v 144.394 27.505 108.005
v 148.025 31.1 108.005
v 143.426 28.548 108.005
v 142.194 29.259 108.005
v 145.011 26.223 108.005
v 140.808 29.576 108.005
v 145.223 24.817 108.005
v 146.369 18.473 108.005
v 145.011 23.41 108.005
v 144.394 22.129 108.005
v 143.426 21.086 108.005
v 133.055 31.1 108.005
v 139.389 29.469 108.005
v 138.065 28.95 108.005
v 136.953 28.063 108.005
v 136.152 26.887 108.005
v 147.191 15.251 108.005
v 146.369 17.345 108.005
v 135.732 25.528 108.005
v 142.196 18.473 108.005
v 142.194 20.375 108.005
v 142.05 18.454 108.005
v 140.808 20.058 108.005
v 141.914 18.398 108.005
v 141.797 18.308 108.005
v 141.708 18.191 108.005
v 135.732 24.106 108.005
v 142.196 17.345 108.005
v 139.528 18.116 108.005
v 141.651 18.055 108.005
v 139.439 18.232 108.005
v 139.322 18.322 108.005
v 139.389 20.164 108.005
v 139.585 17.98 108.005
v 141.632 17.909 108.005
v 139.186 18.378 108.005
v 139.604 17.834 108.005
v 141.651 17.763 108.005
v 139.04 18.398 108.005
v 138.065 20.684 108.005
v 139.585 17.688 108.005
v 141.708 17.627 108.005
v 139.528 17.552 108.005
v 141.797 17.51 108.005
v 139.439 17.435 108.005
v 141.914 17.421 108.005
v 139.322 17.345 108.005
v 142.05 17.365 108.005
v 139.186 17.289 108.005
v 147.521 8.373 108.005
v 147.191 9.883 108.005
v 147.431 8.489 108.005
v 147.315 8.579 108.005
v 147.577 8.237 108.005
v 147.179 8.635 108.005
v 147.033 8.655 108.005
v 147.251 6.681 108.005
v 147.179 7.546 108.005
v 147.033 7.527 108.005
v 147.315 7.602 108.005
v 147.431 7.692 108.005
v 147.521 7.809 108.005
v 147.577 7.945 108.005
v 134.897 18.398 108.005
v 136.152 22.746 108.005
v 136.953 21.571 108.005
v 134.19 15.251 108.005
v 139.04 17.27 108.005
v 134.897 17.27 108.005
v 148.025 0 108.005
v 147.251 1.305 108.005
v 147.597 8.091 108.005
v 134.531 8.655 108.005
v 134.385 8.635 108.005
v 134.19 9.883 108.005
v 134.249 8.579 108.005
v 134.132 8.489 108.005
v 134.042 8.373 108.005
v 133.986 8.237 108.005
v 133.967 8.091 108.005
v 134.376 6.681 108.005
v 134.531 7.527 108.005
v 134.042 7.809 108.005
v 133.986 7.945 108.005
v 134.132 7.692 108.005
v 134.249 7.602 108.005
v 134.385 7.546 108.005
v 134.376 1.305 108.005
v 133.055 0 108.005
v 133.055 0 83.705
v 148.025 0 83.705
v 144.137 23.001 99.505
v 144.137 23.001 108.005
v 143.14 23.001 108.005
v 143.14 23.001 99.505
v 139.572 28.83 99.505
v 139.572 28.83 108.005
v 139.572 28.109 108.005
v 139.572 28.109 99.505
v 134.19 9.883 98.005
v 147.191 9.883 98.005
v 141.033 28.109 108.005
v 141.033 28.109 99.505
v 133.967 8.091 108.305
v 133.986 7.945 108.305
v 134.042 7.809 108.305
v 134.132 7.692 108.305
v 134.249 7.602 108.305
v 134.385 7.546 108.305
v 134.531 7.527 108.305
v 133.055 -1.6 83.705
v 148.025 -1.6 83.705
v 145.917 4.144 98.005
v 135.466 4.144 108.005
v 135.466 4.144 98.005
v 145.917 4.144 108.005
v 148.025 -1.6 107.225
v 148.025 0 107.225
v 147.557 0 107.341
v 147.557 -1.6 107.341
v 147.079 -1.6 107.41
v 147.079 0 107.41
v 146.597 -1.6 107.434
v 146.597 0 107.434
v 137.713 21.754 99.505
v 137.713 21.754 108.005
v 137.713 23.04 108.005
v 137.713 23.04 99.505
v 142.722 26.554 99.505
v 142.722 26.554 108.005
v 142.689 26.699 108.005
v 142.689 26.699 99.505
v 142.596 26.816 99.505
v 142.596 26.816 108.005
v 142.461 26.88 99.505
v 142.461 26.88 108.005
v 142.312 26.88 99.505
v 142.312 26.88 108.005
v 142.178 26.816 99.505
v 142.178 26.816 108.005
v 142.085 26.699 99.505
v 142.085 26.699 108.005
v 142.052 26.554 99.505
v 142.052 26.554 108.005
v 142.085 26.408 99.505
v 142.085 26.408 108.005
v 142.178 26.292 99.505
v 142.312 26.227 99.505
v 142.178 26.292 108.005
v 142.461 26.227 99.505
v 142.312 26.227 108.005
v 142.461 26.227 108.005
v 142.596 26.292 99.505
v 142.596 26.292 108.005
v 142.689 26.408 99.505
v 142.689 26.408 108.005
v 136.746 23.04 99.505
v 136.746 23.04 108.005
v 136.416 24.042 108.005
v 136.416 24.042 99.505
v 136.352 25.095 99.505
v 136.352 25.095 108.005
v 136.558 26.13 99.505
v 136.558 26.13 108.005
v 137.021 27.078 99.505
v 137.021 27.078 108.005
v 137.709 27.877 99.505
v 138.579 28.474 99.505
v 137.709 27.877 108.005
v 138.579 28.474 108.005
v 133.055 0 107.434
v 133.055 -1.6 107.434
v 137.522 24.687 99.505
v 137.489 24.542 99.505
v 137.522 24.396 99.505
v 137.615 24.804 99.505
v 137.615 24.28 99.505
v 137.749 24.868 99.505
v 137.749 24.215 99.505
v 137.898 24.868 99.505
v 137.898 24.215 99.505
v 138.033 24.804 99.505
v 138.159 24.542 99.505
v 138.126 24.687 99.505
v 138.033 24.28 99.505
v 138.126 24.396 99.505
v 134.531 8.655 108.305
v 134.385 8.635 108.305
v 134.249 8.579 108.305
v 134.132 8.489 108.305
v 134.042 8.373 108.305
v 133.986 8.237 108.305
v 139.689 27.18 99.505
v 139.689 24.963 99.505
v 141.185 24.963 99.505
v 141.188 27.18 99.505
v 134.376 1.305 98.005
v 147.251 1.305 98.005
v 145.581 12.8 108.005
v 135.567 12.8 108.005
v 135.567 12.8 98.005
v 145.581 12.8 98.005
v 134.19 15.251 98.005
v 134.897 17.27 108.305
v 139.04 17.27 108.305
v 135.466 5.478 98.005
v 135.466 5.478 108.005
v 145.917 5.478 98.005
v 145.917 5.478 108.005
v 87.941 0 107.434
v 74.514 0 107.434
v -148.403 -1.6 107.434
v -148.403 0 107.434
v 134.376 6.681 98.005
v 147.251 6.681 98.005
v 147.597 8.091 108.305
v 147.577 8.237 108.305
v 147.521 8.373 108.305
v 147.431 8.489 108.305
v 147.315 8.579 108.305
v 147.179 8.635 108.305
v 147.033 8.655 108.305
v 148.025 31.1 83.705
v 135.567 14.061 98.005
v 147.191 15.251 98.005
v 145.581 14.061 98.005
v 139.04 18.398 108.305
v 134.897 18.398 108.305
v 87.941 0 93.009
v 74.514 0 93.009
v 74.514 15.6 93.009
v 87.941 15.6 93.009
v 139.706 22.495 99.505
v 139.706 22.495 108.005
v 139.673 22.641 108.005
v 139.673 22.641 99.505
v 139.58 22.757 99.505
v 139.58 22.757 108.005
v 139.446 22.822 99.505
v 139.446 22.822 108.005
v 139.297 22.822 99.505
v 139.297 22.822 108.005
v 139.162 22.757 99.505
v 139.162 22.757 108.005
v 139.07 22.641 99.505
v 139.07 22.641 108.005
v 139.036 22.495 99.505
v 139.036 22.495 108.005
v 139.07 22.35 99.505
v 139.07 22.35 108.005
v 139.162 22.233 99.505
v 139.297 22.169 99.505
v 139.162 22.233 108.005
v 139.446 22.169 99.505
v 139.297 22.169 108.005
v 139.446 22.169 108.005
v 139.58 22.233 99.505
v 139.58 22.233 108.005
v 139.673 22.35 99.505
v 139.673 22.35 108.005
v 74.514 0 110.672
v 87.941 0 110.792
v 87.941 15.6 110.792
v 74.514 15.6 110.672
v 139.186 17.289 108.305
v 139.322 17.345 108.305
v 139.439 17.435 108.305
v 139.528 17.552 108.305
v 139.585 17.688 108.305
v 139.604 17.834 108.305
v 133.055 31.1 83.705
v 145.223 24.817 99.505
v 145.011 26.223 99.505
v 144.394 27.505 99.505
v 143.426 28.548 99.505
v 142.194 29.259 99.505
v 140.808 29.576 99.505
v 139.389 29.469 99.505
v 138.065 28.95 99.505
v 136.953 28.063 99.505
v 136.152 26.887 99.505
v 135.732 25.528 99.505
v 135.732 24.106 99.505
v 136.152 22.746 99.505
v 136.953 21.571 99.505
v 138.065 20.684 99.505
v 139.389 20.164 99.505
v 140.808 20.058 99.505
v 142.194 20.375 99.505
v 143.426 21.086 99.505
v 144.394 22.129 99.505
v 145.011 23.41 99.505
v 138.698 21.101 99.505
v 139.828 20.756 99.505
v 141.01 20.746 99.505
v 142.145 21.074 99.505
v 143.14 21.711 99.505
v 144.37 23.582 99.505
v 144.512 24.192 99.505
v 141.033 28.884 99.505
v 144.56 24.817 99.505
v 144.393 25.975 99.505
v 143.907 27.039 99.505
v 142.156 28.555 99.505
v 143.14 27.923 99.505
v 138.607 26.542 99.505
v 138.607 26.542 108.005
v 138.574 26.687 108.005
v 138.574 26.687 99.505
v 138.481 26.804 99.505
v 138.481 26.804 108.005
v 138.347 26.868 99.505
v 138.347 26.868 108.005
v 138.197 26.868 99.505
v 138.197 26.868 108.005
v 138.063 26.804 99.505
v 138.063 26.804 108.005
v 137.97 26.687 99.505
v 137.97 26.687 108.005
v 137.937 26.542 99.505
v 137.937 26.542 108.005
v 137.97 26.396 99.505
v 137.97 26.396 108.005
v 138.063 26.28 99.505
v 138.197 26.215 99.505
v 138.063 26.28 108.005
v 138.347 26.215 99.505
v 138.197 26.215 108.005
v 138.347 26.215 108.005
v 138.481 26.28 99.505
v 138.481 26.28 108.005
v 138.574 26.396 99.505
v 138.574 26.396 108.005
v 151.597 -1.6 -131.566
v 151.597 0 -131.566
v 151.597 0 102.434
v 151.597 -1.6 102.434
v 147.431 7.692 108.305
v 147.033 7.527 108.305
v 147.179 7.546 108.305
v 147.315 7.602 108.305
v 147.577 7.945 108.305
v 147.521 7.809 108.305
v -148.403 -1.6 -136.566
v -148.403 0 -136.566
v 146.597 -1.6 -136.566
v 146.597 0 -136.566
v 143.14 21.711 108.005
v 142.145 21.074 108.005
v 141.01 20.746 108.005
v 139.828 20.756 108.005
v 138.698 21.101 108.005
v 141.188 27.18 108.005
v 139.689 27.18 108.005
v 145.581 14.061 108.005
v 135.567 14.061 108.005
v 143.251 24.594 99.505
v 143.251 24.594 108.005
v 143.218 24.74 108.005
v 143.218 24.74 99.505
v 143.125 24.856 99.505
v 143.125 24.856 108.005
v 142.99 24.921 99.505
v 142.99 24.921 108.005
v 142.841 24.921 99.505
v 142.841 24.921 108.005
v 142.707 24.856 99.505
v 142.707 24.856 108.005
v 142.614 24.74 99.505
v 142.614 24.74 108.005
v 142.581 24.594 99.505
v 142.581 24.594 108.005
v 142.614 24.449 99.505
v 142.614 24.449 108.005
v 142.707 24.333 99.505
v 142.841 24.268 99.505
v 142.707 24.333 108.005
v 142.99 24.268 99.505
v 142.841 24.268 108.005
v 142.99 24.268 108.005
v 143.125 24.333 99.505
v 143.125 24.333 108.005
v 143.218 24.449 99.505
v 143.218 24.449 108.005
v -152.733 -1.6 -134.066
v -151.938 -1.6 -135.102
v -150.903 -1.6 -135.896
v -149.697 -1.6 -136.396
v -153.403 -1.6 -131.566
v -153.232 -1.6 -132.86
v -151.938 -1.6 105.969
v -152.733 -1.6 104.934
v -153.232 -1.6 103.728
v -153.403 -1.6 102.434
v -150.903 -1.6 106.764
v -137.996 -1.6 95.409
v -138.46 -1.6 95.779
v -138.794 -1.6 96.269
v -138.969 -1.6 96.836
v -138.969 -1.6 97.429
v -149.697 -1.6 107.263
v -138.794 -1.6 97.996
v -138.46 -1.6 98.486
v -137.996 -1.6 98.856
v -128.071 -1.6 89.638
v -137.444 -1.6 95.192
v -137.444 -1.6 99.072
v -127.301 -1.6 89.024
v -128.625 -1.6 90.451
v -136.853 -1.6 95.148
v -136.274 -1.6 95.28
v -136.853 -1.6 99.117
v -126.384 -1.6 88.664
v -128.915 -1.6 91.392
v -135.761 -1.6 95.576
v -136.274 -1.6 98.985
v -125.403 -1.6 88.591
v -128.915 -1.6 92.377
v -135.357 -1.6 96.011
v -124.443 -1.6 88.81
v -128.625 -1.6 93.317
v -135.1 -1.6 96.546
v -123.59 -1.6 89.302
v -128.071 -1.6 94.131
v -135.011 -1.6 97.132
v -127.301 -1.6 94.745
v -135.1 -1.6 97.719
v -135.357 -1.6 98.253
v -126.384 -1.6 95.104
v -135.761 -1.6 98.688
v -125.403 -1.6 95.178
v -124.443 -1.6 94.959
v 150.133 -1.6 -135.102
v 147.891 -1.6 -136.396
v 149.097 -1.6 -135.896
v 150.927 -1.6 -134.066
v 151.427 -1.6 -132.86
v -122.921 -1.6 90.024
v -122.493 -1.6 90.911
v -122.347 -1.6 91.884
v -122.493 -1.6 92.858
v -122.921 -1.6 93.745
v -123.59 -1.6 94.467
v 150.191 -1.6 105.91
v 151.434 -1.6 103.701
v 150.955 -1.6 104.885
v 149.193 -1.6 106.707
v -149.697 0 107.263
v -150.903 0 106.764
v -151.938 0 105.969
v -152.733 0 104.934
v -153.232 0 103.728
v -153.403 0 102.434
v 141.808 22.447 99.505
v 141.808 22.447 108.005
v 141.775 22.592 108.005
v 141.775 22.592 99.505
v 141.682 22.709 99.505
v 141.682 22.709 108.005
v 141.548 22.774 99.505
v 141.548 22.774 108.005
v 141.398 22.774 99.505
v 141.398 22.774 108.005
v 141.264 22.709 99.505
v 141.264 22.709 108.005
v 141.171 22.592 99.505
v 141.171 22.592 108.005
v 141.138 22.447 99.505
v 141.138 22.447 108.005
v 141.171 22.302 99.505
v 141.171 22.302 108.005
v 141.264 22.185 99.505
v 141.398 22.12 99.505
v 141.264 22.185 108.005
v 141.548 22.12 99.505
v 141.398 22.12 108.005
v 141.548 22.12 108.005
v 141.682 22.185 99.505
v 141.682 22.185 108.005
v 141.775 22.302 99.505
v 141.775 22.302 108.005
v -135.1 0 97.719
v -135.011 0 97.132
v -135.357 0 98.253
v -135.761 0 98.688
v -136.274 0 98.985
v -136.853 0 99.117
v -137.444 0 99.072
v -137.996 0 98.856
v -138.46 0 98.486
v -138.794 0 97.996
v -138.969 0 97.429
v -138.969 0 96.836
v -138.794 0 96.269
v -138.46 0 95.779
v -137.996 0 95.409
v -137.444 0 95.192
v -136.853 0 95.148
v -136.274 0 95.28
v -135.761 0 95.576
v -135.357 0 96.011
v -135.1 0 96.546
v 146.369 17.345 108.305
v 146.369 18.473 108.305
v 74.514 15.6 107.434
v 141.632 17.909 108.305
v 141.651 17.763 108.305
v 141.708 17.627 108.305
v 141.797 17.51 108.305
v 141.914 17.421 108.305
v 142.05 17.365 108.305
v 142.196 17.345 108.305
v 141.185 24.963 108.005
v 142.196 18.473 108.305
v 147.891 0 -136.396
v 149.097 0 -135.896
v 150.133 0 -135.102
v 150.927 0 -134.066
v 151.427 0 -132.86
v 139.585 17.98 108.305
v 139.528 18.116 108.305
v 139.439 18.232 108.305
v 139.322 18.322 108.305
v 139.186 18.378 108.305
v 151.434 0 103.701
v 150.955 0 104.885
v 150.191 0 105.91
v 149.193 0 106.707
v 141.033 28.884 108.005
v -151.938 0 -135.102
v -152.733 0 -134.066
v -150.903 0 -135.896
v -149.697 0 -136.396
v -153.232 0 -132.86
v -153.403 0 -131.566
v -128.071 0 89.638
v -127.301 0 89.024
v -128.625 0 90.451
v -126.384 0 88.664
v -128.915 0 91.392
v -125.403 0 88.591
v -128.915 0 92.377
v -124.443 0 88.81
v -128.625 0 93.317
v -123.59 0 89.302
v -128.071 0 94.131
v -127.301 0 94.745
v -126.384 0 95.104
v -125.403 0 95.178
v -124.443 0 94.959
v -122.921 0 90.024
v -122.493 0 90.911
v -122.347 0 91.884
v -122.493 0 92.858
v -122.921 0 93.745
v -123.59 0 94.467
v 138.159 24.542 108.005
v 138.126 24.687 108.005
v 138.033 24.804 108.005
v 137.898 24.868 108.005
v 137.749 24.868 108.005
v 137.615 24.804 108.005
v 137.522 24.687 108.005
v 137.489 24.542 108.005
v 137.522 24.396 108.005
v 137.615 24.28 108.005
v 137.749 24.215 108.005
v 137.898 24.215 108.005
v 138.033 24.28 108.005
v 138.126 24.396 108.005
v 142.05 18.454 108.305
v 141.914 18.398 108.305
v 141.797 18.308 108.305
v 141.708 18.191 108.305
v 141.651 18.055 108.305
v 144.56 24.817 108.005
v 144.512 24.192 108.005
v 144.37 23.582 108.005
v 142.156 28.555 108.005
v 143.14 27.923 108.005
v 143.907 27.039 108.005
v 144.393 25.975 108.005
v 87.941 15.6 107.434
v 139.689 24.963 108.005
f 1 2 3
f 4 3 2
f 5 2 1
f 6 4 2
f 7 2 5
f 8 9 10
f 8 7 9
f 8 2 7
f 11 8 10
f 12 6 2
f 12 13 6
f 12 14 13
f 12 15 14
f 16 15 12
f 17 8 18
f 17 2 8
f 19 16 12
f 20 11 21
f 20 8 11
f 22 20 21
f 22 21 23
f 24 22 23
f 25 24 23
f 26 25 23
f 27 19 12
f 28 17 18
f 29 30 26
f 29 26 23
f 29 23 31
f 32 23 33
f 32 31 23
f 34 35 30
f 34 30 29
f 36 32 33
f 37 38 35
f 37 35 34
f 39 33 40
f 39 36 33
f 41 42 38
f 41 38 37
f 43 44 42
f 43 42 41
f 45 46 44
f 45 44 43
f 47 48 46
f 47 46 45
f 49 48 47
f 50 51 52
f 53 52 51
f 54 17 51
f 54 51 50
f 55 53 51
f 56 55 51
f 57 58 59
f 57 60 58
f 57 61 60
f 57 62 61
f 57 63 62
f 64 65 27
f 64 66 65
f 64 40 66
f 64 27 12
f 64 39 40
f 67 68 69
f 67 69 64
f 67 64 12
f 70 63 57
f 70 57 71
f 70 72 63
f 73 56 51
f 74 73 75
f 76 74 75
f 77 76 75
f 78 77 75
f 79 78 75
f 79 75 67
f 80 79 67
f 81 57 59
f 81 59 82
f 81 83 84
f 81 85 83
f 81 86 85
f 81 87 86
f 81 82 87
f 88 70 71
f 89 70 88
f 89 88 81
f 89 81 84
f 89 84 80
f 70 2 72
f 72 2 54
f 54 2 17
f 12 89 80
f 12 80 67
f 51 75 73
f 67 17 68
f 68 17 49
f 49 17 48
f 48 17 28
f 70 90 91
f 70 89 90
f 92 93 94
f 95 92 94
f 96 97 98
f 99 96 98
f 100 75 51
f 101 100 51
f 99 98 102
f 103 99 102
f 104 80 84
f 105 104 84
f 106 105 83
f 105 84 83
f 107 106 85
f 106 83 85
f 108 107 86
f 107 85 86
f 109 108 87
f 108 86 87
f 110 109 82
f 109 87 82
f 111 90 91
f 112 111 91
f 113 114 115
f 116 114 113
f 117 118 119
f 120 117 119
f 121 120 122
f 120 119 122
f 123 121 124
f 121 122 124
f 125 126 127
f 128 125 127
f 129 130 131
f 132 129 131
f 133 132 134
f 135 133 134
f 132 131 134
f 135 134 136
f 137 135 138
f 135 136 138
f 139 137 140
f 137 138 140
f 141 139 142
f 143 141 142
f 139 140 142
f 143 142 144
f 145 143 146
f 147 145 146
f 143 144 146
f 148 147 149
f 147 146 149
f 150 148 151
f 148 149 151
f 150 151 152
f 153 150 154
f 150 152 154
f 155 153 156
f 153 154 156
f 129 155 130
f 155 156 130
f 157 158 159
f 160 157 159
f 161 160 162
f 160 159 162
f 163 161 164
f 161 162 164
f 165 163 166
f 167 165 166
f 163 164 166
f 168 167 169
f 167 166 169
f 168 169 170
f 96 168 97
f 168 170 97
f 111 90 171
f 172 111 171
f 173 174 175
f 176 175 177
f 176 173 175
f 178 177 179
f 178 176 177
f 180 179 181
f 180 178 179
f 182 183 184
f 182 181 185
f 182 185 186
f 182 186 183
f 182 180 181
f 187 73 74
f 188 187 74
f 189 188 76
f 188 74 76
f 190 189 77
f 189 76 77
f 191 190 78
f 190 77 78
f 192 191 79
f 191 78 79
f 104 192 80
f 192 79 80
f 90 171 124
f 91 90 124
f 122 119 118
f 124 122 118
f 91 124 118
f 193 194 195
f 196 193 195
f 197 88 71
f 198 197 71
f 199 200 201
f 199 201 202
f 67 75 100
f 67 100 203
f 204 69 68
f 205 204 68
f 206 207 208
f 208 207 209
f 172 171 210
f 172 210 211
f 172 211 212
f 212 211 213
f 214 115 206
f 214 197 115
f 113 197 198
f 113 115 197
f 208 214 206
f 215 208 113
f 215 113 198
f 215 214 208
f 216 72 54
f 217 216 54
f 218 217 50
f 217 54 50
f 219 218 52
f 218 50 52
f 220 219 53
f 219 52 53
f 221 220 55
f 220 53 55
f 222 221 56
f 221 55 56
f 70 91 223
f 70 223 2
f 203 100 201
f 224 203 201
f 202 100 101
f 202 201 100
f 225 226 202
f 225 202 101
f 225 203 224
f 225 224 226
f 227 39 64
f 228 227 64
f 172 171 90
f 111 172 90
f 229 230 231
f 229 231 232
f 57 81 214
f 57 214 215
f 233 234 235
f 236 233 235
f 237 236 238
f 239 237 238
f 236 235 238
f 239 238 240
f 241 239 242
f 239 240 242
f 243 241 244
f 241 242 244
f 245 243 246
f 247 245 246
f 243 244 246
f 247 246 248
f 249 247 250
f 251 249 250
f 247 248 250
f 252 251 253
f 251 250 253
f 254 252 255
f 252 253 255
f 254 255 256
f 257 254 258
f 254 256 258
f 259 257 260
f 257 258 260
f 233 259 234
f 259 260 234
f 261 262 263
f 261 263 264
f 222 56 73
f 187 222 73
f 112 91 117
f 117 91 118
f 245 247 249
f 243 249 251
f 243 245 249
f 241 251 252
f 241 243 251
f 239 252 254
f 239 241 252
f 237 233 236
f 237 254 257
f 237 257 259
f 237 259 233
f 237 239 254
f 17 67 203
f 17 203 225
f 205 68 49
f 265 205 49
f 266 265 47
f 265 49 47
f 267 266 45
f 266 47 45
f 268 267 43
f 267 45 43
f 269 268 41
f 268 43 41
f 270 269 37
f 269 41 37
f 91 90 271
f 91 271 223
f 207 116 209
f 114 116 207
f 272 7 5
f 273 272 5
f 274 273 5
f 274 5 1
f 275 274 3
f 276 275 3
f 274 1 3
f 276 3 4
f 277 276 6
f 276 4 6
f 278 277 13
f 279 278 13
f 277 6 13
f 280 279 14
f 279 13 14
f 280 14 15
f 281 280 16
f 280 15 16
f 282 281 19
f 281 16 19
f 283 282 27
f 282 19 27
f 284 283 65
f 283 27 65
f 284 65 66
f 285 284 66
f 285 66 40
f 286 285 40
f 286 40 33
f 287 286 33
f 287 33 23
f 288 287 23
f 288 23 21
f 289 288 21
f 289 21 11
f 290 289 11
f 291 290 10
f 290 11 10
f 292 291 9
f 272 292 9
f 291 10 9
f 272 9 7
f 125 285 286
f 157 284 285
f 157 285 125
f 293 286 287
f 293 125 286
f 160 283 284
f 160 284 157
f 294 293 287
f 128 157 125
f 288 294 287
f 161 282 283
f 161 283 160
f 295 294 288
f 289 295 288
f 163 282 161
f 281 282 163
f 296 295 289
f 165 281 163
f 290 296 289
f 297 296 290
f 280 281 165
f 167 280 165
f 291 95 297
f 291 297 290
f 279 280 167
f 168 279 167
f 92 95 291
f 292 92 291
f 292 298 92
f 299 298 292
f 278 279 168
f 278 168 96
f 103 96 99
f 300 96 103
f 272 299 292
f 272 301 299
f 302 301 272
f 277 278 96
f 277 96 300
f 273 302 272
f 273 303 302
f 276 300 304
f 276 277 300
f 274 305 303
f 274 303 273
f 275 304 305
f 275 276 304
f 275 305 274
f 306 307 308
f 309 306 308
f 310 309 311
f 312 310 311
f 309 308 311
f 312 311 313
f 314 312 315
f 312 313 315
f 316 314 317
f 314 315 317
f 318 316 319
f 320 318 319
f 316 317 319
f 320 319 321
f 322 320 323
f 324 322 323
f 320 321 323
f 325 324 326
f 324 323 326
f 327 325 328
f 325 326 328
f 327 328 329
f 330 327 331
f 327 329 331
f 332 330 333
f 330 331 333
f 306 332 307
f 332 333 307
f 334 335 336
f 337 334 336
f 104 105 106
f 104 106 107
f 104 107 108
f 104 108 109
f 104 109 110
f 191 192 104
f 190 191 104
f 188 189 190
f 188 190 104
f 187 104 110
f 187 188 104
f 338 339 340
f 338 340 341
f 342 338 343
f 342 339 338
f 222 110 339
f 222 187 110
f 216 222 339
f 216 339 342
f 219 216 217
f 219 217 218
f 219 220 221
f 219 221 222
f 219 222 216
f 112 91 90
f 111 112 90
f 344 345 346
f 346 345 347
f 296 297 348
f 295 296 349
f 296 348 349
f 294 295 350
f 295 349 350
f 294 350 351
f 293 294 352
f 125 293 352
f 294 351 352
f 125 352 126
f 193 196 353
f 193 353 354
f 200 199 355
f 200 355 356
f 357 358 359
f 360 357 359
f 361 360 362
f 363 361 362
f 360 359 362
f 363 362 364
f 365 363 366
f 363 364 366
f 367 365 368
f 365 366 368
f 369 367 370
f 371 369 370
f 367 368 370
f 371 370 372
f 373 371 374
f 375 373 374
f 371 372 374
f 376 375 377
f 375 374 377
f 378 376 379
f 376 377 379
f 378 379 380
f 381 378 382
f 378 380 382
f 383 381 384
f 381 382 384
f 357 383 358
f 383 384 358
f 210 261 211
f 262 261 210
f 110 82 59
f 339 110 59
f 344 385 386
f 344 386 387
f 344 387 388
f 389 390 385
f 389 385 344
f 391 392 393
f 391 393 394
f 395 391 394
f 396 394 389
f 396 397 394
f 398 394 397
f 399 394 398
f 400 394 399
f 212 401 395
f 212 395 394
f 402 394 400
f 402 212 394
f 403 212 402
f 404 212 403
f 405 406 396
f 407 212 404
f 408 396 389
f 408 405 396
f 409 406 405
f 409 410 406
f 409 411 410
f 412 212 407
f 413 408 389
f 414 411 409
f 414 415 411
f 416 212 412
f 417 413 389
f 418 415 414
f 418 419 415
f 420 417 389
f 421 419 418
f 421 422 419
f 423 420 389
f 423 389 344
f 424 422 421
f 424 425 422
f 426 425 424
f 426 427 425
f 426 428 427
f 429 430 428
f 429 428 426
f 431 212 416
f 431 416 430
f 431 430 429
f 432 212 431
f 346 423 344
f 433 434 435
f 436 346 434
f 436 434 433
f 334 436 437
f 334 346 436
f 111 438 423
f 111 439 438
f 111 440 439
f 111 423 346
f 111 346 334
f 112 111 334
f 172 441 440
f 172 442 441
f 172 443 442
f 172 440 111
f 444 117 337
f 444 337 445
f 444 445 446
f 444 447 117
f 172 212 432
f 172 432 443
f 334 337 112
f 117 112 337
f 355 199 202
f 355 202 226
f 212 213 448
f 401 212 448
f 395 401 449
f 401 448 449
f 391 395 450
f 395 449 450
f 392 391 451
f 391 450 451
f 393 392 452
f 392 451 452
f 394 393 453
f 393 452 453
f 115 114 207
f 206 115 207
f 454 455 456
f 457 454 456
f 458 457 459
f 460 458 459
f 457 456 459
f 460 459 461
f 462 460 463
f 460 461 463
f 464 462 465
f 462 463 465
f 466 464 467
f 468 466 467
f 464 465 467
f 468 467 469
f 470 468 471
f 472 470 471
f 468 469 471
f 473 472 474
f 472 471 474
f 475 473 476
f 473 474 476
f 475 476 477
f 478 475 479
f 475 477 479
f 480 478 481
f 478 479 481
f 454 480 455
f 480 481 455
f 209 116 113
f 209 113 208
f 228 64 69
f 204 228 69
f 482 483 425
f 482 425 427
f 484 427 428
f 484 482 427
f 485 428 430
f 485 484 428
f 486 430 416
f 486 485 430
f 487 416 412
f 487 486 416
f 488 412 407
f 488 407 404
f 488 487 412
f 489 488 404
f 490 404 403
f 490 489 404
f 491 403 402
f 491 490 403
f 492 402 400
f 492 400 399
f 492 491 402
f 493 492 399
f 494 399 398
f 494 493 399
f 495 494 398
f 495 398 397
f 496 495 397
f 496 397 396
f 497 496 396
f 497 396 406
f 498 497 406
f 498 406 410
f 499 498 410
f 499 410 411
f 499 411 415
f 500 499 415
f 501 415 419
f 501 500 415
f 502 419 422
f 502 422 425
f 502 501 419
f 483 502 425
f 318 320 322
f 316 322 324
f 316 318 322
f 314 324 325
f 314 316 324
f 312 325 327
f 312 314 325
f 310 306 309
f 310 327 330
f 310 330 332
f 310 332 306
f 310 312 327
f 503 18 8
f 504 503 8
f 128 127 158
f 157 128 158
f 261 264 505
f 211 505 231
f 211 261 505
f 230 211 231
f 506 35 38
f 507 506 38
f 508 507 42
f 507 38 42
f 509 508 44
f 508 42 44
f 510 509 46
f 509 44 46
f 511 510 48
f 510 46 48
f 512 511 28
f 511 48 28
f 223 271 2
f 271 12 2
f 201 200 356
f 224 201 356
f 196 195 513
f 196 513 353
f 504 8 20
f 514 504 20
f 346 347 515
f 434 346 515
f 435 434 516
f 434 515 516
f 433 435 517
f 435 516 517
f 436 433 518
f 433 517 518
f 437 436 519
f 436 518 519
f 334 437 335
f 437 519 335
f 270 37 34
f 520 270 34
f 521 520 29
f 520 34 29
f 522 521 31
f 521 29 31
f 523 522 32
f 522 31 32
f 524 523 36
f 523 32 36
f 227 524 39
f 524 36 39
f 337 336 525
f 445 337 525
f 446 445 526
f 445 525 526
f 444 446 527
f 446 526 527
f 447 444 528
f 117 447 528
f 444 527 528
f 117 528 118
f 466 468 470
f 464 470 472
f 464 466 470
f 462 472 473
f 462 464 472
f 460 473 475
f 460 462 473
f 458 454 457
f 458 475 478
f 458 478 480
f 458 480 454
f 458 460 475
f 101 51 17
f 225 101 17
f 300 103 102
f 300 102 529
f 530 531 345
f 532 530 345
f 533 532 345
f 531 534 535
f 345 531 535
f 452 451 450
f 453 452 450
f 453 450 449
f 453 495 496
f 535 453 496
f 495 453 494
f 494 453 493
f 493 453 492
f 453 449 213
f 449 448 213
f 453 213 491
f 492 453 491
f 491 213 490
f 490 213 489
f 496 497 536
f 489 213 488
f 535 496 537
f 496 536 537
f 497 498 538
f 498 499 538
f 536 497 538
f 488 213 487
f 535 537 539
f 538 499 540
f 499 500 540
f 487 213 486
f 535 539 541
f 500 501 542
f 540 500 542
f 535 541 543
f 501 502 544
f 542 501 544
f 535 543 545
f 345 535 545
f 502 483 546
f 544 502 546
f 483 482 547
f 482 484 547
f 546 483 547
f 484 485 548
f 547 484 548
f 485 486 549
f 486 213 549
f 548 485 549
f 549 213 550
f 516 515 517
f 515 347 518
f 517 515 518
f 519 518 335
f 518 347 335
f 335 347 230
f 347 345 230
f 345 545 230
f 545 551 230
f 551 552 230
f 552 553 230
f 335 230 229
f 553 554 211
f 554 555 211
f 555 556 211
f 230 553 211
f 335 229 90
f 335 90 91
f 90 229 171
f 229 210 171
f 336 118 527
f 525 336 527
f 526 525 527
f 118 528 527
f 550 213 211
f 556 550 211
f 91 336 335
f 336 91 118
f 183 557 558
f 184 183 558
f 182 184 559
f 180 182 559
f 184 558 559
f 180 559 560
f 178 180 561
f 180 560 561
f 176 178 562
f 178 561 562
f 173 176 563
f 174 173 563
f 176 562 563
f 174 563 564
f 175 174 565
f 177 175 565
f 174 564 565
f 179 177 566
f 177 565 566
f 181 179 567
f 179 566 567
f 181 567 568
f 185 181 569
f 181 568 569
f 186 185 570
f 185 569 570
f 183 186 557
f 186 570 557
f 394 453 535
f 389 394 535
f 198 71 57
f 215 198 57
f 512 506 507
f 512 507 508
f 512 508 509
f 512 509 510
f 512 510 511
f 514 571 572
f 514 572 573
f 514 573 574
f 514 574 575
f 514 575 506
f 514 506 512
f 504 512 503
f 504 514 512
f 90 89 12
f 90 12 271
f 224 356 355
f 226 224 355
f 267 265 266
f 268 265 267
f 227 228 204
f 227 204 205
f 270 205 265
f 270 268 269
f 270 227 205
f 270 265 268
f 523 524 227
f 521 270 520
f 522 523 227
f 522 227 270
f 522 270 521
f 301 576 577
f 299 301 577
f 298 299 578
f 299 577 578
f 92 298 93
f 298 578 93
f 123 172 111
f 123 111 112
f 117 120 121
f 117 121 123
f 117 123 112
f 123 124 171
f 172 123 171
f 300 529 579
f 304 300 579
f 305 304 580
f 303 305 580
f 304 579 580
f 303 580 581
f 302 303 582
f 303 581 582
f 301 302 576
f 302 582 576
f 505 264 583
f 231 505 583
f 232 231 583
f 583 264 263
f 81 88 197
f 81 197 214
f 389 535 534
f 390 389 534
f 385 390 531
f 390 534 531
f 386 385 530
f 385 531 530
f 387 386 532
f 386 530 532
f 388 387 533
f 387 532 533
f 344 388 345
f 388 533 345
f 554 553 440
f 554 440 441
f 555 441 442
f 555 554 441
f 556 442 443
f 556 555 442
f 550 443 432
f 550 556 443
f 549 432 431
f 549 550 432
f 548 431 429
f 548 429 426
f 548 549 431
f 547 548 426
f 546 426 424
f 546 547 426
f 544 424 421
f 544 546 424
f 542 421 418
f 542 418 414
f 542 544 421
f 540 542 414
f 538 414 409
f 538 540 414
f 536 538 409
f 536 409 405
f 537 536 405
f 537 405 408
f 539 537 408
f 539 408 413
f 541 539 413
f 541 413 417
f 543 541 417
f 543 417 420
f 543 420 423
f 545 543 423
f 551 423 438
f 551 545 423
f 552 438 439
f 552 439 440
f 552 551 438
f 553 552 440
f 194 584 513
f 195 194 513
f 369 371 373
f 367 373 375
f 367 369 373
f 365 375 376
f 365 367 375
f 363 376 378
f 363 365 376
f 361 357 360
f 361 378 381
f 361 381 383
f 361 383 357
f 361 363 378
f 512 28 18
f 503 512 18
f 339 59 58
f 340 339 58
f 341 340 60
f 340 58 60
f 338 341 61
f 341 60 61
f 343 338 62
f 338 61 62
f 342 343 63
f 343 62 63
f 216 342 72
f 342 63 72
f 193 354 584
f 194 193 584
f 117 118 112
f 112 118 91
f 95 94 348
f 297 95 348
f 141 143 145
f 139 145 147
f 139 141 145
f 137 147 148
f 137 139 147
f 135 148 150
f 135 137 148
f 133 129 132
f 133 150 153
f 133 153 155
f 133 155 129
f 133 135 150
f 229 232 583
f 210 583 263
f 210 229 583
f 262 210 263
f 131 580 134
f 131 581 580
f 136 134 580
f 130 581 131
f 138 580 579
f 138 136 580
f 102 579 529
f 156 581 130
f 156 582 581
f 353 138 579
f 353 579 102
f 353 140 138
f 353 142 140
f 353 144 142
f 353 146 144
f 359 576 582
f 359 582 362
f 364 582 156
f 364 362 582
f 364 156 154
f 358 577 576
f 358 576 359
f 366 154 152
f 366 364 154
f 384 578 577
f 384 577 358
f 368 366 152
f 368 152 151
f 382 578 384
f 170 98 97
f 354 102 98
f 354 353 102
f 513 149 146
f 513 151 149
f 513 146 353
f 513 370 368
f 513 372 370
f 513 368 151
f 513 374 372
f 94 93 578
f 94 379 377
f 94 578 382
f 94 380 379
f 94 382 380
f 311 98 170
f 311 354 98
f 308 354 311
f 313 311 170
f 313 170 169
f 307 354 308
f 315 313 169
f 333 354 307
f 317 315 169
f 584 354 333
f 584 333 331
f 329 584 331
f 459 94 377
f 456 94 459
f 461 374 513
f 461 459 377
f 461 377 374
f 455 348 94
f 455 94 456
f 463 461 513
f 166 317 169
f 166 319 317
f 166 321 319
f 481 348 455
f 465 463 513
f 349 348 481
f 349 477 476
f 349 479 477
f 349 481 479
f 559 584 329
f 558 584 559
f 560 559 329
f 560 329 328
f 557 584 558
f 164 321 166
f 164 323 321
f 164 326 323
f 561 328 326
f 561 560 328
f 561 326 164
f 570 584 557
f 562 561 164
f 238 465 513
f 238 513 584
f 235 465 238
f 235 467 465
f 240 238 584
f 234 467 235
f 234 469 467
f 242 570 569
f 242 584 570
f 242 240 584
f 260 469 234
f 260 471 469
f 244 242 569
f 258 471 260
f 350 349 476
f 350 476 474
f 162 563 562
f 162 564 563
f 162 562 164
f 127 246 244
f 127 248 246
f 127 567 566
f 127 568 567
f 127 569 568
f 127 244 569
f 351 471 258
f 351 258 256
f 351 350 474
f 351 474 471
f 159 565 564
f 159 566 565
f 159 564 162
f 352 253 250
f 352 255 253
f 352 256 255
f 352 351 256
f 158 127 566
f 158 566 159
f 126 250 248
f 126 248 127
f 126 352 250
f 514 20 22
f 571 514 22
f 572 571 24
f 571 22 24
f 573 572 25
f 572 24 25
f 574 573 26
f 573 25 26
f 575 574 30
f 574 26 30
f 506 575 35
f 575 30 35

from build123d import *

# Parameters (mm, degrees)
F1_DEPTH  = 31.1
F2_R      = 4.7721035724
F2_R_2    = 0.335
F3_DEPTH  = 8.5
F4_DEPTH  = 0.3
F2_W      = 13.0011439323
F2_H      = 5.3685186431
F2_W_2    = 10.013461113
F2_H_2    = 1.2604352087
F2_W_3    = 12.8749459982
F2_H_3    = 5.3755240515
F2_W_4    = 10.4503333569
F2_H_4    = 1.3344832696
F5_DEPTH  = 10
F6_DEPTH  = 0.3
F0_R      = 3.3028242823
F0_R_2    = 1.9899956973
F7_DEPTH  = 1.6
F8_DEPTH  = 1.6
F9_W      = 13.4265273809
F9_H      = 14.4242305644
F10_DEPTH = 15.6


with BuildPart() as f1:
    # F0 (on Front) → F1 (new body)
    with BuildSketch(Plane.XZ):
        with BuildLine():
            Line((146.5973348236, 107.4337024577), (133.0546587706, 107.4337024577))
            Line((133.0546587706, 107.4337024577), (133.0546587706, 83.7045535445))
            Line((133.0546587706, 83.7045535445), (148.0253636837, 83.7045535445))
            Line((148.0253636837, 83.7045535445), (148.0253636837, 107.2254384245))
            ThreePointArc((148.0253636837, 107.2254384245), (147.3189026189, 107.3813625023), (146.5973348236, 107.4337024577))
        make_face()
        with BuildLine():
            Line((133.0546587706, 108.0053970218), (133.0546587706, 107.4337024577))
            Line((133.0546587706, 107.4337024577), (146.5973348236, 107.4337024577))
            ThreePointArc((146.5973348236, 107.4337024577), (147.3189026189, 107.3813625023), (148.0253636837, 107.2254384245))
            Line((148.0253636837, 107.2254384245), (148.0253636837, 108.0053970218))
            Line((148.0253636837, 108.0053970218), (133.0546587706, 108.0053970218))
        make_face()
    extrude(amount=-F1_DEPTH)

    # F2 (on face) → F3 (cut)
    with BuildSketch(Plane.XY.offset(108.0053970218)):
        with Locations((140.4510243781, 24.8168191715)):
            Circle(F2_R)
        with BuildLine():
            ThreePointArc((141.0332918167, 28.8838842541), (143.5552408232, 27.5082674839), (144.559558637, 24.8168191715))
            ThreePointArc((144.559558637, 24.8168191715), (144.4524142101, 23.8846533229), (144.136569262, 23.0011064559))
            ThreePointArc((144.136569262, 23.0011064559), (143.7031314856, 22.3060716497), (143.1404302446, 21.7108330411))
            ThreePointArc((143.1404302446, 21.7108330411), (140.4183904808, 20.7084145193), (137.7126180122, 21.7539472623))
            ThreePointArc((137.7126180122, 21.7539472623), (137.1659240775, 22.3493974864), (136.7463979999, 23.0403628239))
            ThreePointArc((136.7463979999, 23.0403628239), (136.7586772419, 26.6186588932), (139.5717839459, 28.8301706411))
            ThreePointArc((139.5717839459, 28.8301706411), (140.3001286267, 28.9225814915), (141.0332918167, 28.8838842541))
        make_face(mode=Mode.SUBTRACT)
        Polygon((139.689207077, 24.9626487494), (141.1854624748, 24.9626487494), (141.1884874105, 27.1797347814), (139.689207077, 27.1797347814), align=None)
        with BuildLine():
            Line((141.0332918167, 28.1090545301), (141.0332918167, 28.8838842541))
            ThreePointArc((141.0332918167, 28.8838842541), (140.3001286267, 28.9225814915), (139.5717839459, 28.8301706411))
            Line((139.5717839459, 28.8301706411), (139.5717839459, 28.1090545301))
            Line((139.5717839459, 28.1090545301), (141.0332918167, 28.1090545301))
        make_face()
        with BuildLine():
            ThreePointArc((143.1404302446, 21.7108330411), (143.7031314856, 22.3060716497), (144.136569262, 23.0011064559))
            Line((144.136569262, 23.0011064559), (143.1404302446, 23.0011064559))
            Line((143.1404302446, 23.0011064559), (143.1404302446, 21.7108330411))
        make_face()
        with BuildLine():
            Line((137.7126180122, 23.0403628239), (136.7463979999, 23.0403628239))
            ThreePointArc((136.7463979999, 23.0403628239), (137.1659240775, 22.3493974864), (137.7126180122, 21.7539472623))
            Line((137.7126180122, 21.7539472623), (137.7126180122, 23.0403628239))
        make_face()
        with Locations((141.4729776408, 22.4469911506)):
            Circle(F2_R_2)
        with Locations((139.3713495952, 22.4953122328)):
            Circle(F2_R_2)
        with Locations((137.8236935557, 24.5415867312)):
            Circle(F2_R_2)
        with Locations((138.271967138, 26.541619488)):
            Circle(F2_R_2)
        with Locations((142.3867255578, 26.5537630882)):
            Circle(F2_R_2)
        with Locations((142.9156926089, 24.5944873077)):
            Circle(F2_R_2)
    extrude(amount=-F3_DEPTH, mode=Mode.SUBTRACT)

    # F2 (on face) → F4 (join)
    with BuildSketch(Plane.XY.offset(108.0053970218)):
        with BuildLine():
            Line((139.039972435, 18.3976299851), (134.8969787359, 18.3976299851))
            Line((134.8969787359, 18.3976299851), (134.8969787359, 17.2696299851))
            Line((134.8969787359, 17.2696299851), (139.039972435, 17.2696299851))
            ThreePointArc((139.039972435, 17.2696299851), (139.4387806596, 17.4348217605), (139.603972435, 17.8336299851))
            ThreePointArc((139.603972435, 17.8336299851), (139.4387806596, 18.2324382097), (139.039972435, 18.3976299851))
        make_face()
        with BuildLine():
            Line((146.3693231344, 17.3453036696), (146.3693231344, 18.4733036696))
            Line((146.3693231344, 18.4733036696), (142.196065177, 18.4733036696))
            ThreePointArc((142.196065177, 18.4733036696), (141.7972569524, 18.3081118942), (141.632065177, 17.9093036696))
            ThreePointArc((141.632065177, 17.9093036696), (141.7972569524, 17.510495445), (142.196065177, 17.3453036696))
            Line((142.196065177, 17.3453036696), (146.3693231344, 17.3453036696))
        make_face()
    extrude(amount=F4_DEPTH)

    # F2 (on face) → F5 (cut)
    with BuildSketch(Plane.XY.offset(108.0053970218)):
        with Locations((140.6905353069, 12.5670242123)):
            Rectangle(F2_W, F2_H)
        with Locations((140.5738294125, 13.4306559339)):
            Rectangle(F2_W_2, F2_H_2, mode=Mode.SUBTRACT)
        with Locations((140.8137604594, 3.9931773208)):
            Rectangle(F2_W_3, F2_H_3)
        with Locations((140.6915932894, 4.8107833136)):
            Rectangle(F2_W_4, F2_H_4, mode=Mode.SUBTRACT)
    extrude(amount=-F5_DEPTH, mode=Mode.SUBTRACT)

    # F2 (on face) → F6 (join)
    with BuildSketch(Plane.XY.offset(108.0053970218)):
        with BuildLine():
            Line((147.0326870785, 8.654551839), (134.5309376612, 8.654551839))
            ThreePointArc((134.5309376612, 8.654551839), (134.1321294366, 8.4893600636), (133.9669376612, 8.090551839))
            ThreePointArc((133.9669376612, 8.090551839), (134.1321294366, 7.6917436144), (134.5309376612, 7.526551839))
            Line((134.5309376612, 7.526551839), (147.0326870785, 7.526551839))
            ThreePointArc((147.0326870785, 7.526551839), (147.4314953031, 7.6917436144), (147.5966870785, 8.090551839))
            ThreePointArc((147.5966870785, 8.090551839), (147.4314953031, 8.4893600636), (147.0326870785, 8.654551839))
        make_face()
    extrude(amount=F6_DEPTH)


with BuildPart() as f7:
    # F0 (on Front) → F7 (new body)
    with BuildSketch(Plane.XZ):
        with BuildLine():
            Line((133.0546587706, 107.4337024577), (-148.4026651764, 107.4337024577))
            ThreePointArc((-148.4026651764, 107.4337024577), (-151.9381990823, 105.9692363637), (-153.4026651764, 102.4337024577))
            Line((-153.4026651764, 102.4337024577), (-153.4026651764, -131.5662975423))
            ThreePointArc((-153.4026651764, -131.5662975423), (-151.9381990823, -135.1018314482), (-148.4026651764, -136.5662975423))
            Line((-148.4026651764, -136.5662975423), (146.5973348236, -136.5662975423))
            ThreePointArc((146.5973348236, -136.5662975423), (150.1328687296, -135.1018314482), (151.5973348236, -131.5662975423))
            Line((151.5973348236, -131.5662975423), (151.5973348236, 102.4337024577))
            ThreePointArc((151.5973348236, 102.4337024577), (150.6060842733, 105.4220009451), (148.0253636837, 107.2254384245))
            Line((148.0253636837, 107.2254384245), (148.0253636837, 83.7045535445))
            Line((148.0253636837, 83.7045535445), (133.0546587706, 83.7045535445))
            Line((133.0546587706, 83.7045535445), (133.0546587706, 107.4337024577))
        make_face()
        with Locations((-125.6494671106, 91.8843820691)):
            Circle(F0_R, mode=Mode.SUBTRACT)
        with Locations((-137.001350522, 97.1322059631)):
            Circle(F0_R_2, mode=Mode.SUBTRACT)
    extrude(amount=F7_DEPTH)

    # F9 (on face) → F10 (join)
    with BuildSketch(Plane.XZ):
        Polygon((87.9408195615, 107.4337024577), (87.9408195615, 110.7915863395), (74.5142921805, 110.672429204), (74.5142921805, 107.4337024577), align=None)
        with Locations((81.227555871, 100.2215871755)):
            Rectangle(F9_W, F9_H)
    extrude(amount=-F10_DEPTH)


with BuildPart() as f8:
    # F0 (on Front) → F8 (new body)
    with BuildSketch(Plane.XZ):
        with BuildLine():
            Line((146.5973348236, 107.4337024577), (133.0546587706, 107.4337024577))
            Line((133.0546587706, 107.4337024577), (133.0546587706, 83.7045535445))
            Line((133.0546587706, 83.7045535445), (148.0253636837, 83.7045535445))
            Line((148.0253636837, 83.7045535445), (148.0253636837, 107.2254384245))
            ThreePointArc((148.0253636837, 107.2254384245), (147.3189026189, 107.3813625023), (146.5973348236, 107.4337024577))
        make_face()
    extrude(amount=F8_DEPTH)


solid = Compound([f1.part, f7.part, f8.part])
